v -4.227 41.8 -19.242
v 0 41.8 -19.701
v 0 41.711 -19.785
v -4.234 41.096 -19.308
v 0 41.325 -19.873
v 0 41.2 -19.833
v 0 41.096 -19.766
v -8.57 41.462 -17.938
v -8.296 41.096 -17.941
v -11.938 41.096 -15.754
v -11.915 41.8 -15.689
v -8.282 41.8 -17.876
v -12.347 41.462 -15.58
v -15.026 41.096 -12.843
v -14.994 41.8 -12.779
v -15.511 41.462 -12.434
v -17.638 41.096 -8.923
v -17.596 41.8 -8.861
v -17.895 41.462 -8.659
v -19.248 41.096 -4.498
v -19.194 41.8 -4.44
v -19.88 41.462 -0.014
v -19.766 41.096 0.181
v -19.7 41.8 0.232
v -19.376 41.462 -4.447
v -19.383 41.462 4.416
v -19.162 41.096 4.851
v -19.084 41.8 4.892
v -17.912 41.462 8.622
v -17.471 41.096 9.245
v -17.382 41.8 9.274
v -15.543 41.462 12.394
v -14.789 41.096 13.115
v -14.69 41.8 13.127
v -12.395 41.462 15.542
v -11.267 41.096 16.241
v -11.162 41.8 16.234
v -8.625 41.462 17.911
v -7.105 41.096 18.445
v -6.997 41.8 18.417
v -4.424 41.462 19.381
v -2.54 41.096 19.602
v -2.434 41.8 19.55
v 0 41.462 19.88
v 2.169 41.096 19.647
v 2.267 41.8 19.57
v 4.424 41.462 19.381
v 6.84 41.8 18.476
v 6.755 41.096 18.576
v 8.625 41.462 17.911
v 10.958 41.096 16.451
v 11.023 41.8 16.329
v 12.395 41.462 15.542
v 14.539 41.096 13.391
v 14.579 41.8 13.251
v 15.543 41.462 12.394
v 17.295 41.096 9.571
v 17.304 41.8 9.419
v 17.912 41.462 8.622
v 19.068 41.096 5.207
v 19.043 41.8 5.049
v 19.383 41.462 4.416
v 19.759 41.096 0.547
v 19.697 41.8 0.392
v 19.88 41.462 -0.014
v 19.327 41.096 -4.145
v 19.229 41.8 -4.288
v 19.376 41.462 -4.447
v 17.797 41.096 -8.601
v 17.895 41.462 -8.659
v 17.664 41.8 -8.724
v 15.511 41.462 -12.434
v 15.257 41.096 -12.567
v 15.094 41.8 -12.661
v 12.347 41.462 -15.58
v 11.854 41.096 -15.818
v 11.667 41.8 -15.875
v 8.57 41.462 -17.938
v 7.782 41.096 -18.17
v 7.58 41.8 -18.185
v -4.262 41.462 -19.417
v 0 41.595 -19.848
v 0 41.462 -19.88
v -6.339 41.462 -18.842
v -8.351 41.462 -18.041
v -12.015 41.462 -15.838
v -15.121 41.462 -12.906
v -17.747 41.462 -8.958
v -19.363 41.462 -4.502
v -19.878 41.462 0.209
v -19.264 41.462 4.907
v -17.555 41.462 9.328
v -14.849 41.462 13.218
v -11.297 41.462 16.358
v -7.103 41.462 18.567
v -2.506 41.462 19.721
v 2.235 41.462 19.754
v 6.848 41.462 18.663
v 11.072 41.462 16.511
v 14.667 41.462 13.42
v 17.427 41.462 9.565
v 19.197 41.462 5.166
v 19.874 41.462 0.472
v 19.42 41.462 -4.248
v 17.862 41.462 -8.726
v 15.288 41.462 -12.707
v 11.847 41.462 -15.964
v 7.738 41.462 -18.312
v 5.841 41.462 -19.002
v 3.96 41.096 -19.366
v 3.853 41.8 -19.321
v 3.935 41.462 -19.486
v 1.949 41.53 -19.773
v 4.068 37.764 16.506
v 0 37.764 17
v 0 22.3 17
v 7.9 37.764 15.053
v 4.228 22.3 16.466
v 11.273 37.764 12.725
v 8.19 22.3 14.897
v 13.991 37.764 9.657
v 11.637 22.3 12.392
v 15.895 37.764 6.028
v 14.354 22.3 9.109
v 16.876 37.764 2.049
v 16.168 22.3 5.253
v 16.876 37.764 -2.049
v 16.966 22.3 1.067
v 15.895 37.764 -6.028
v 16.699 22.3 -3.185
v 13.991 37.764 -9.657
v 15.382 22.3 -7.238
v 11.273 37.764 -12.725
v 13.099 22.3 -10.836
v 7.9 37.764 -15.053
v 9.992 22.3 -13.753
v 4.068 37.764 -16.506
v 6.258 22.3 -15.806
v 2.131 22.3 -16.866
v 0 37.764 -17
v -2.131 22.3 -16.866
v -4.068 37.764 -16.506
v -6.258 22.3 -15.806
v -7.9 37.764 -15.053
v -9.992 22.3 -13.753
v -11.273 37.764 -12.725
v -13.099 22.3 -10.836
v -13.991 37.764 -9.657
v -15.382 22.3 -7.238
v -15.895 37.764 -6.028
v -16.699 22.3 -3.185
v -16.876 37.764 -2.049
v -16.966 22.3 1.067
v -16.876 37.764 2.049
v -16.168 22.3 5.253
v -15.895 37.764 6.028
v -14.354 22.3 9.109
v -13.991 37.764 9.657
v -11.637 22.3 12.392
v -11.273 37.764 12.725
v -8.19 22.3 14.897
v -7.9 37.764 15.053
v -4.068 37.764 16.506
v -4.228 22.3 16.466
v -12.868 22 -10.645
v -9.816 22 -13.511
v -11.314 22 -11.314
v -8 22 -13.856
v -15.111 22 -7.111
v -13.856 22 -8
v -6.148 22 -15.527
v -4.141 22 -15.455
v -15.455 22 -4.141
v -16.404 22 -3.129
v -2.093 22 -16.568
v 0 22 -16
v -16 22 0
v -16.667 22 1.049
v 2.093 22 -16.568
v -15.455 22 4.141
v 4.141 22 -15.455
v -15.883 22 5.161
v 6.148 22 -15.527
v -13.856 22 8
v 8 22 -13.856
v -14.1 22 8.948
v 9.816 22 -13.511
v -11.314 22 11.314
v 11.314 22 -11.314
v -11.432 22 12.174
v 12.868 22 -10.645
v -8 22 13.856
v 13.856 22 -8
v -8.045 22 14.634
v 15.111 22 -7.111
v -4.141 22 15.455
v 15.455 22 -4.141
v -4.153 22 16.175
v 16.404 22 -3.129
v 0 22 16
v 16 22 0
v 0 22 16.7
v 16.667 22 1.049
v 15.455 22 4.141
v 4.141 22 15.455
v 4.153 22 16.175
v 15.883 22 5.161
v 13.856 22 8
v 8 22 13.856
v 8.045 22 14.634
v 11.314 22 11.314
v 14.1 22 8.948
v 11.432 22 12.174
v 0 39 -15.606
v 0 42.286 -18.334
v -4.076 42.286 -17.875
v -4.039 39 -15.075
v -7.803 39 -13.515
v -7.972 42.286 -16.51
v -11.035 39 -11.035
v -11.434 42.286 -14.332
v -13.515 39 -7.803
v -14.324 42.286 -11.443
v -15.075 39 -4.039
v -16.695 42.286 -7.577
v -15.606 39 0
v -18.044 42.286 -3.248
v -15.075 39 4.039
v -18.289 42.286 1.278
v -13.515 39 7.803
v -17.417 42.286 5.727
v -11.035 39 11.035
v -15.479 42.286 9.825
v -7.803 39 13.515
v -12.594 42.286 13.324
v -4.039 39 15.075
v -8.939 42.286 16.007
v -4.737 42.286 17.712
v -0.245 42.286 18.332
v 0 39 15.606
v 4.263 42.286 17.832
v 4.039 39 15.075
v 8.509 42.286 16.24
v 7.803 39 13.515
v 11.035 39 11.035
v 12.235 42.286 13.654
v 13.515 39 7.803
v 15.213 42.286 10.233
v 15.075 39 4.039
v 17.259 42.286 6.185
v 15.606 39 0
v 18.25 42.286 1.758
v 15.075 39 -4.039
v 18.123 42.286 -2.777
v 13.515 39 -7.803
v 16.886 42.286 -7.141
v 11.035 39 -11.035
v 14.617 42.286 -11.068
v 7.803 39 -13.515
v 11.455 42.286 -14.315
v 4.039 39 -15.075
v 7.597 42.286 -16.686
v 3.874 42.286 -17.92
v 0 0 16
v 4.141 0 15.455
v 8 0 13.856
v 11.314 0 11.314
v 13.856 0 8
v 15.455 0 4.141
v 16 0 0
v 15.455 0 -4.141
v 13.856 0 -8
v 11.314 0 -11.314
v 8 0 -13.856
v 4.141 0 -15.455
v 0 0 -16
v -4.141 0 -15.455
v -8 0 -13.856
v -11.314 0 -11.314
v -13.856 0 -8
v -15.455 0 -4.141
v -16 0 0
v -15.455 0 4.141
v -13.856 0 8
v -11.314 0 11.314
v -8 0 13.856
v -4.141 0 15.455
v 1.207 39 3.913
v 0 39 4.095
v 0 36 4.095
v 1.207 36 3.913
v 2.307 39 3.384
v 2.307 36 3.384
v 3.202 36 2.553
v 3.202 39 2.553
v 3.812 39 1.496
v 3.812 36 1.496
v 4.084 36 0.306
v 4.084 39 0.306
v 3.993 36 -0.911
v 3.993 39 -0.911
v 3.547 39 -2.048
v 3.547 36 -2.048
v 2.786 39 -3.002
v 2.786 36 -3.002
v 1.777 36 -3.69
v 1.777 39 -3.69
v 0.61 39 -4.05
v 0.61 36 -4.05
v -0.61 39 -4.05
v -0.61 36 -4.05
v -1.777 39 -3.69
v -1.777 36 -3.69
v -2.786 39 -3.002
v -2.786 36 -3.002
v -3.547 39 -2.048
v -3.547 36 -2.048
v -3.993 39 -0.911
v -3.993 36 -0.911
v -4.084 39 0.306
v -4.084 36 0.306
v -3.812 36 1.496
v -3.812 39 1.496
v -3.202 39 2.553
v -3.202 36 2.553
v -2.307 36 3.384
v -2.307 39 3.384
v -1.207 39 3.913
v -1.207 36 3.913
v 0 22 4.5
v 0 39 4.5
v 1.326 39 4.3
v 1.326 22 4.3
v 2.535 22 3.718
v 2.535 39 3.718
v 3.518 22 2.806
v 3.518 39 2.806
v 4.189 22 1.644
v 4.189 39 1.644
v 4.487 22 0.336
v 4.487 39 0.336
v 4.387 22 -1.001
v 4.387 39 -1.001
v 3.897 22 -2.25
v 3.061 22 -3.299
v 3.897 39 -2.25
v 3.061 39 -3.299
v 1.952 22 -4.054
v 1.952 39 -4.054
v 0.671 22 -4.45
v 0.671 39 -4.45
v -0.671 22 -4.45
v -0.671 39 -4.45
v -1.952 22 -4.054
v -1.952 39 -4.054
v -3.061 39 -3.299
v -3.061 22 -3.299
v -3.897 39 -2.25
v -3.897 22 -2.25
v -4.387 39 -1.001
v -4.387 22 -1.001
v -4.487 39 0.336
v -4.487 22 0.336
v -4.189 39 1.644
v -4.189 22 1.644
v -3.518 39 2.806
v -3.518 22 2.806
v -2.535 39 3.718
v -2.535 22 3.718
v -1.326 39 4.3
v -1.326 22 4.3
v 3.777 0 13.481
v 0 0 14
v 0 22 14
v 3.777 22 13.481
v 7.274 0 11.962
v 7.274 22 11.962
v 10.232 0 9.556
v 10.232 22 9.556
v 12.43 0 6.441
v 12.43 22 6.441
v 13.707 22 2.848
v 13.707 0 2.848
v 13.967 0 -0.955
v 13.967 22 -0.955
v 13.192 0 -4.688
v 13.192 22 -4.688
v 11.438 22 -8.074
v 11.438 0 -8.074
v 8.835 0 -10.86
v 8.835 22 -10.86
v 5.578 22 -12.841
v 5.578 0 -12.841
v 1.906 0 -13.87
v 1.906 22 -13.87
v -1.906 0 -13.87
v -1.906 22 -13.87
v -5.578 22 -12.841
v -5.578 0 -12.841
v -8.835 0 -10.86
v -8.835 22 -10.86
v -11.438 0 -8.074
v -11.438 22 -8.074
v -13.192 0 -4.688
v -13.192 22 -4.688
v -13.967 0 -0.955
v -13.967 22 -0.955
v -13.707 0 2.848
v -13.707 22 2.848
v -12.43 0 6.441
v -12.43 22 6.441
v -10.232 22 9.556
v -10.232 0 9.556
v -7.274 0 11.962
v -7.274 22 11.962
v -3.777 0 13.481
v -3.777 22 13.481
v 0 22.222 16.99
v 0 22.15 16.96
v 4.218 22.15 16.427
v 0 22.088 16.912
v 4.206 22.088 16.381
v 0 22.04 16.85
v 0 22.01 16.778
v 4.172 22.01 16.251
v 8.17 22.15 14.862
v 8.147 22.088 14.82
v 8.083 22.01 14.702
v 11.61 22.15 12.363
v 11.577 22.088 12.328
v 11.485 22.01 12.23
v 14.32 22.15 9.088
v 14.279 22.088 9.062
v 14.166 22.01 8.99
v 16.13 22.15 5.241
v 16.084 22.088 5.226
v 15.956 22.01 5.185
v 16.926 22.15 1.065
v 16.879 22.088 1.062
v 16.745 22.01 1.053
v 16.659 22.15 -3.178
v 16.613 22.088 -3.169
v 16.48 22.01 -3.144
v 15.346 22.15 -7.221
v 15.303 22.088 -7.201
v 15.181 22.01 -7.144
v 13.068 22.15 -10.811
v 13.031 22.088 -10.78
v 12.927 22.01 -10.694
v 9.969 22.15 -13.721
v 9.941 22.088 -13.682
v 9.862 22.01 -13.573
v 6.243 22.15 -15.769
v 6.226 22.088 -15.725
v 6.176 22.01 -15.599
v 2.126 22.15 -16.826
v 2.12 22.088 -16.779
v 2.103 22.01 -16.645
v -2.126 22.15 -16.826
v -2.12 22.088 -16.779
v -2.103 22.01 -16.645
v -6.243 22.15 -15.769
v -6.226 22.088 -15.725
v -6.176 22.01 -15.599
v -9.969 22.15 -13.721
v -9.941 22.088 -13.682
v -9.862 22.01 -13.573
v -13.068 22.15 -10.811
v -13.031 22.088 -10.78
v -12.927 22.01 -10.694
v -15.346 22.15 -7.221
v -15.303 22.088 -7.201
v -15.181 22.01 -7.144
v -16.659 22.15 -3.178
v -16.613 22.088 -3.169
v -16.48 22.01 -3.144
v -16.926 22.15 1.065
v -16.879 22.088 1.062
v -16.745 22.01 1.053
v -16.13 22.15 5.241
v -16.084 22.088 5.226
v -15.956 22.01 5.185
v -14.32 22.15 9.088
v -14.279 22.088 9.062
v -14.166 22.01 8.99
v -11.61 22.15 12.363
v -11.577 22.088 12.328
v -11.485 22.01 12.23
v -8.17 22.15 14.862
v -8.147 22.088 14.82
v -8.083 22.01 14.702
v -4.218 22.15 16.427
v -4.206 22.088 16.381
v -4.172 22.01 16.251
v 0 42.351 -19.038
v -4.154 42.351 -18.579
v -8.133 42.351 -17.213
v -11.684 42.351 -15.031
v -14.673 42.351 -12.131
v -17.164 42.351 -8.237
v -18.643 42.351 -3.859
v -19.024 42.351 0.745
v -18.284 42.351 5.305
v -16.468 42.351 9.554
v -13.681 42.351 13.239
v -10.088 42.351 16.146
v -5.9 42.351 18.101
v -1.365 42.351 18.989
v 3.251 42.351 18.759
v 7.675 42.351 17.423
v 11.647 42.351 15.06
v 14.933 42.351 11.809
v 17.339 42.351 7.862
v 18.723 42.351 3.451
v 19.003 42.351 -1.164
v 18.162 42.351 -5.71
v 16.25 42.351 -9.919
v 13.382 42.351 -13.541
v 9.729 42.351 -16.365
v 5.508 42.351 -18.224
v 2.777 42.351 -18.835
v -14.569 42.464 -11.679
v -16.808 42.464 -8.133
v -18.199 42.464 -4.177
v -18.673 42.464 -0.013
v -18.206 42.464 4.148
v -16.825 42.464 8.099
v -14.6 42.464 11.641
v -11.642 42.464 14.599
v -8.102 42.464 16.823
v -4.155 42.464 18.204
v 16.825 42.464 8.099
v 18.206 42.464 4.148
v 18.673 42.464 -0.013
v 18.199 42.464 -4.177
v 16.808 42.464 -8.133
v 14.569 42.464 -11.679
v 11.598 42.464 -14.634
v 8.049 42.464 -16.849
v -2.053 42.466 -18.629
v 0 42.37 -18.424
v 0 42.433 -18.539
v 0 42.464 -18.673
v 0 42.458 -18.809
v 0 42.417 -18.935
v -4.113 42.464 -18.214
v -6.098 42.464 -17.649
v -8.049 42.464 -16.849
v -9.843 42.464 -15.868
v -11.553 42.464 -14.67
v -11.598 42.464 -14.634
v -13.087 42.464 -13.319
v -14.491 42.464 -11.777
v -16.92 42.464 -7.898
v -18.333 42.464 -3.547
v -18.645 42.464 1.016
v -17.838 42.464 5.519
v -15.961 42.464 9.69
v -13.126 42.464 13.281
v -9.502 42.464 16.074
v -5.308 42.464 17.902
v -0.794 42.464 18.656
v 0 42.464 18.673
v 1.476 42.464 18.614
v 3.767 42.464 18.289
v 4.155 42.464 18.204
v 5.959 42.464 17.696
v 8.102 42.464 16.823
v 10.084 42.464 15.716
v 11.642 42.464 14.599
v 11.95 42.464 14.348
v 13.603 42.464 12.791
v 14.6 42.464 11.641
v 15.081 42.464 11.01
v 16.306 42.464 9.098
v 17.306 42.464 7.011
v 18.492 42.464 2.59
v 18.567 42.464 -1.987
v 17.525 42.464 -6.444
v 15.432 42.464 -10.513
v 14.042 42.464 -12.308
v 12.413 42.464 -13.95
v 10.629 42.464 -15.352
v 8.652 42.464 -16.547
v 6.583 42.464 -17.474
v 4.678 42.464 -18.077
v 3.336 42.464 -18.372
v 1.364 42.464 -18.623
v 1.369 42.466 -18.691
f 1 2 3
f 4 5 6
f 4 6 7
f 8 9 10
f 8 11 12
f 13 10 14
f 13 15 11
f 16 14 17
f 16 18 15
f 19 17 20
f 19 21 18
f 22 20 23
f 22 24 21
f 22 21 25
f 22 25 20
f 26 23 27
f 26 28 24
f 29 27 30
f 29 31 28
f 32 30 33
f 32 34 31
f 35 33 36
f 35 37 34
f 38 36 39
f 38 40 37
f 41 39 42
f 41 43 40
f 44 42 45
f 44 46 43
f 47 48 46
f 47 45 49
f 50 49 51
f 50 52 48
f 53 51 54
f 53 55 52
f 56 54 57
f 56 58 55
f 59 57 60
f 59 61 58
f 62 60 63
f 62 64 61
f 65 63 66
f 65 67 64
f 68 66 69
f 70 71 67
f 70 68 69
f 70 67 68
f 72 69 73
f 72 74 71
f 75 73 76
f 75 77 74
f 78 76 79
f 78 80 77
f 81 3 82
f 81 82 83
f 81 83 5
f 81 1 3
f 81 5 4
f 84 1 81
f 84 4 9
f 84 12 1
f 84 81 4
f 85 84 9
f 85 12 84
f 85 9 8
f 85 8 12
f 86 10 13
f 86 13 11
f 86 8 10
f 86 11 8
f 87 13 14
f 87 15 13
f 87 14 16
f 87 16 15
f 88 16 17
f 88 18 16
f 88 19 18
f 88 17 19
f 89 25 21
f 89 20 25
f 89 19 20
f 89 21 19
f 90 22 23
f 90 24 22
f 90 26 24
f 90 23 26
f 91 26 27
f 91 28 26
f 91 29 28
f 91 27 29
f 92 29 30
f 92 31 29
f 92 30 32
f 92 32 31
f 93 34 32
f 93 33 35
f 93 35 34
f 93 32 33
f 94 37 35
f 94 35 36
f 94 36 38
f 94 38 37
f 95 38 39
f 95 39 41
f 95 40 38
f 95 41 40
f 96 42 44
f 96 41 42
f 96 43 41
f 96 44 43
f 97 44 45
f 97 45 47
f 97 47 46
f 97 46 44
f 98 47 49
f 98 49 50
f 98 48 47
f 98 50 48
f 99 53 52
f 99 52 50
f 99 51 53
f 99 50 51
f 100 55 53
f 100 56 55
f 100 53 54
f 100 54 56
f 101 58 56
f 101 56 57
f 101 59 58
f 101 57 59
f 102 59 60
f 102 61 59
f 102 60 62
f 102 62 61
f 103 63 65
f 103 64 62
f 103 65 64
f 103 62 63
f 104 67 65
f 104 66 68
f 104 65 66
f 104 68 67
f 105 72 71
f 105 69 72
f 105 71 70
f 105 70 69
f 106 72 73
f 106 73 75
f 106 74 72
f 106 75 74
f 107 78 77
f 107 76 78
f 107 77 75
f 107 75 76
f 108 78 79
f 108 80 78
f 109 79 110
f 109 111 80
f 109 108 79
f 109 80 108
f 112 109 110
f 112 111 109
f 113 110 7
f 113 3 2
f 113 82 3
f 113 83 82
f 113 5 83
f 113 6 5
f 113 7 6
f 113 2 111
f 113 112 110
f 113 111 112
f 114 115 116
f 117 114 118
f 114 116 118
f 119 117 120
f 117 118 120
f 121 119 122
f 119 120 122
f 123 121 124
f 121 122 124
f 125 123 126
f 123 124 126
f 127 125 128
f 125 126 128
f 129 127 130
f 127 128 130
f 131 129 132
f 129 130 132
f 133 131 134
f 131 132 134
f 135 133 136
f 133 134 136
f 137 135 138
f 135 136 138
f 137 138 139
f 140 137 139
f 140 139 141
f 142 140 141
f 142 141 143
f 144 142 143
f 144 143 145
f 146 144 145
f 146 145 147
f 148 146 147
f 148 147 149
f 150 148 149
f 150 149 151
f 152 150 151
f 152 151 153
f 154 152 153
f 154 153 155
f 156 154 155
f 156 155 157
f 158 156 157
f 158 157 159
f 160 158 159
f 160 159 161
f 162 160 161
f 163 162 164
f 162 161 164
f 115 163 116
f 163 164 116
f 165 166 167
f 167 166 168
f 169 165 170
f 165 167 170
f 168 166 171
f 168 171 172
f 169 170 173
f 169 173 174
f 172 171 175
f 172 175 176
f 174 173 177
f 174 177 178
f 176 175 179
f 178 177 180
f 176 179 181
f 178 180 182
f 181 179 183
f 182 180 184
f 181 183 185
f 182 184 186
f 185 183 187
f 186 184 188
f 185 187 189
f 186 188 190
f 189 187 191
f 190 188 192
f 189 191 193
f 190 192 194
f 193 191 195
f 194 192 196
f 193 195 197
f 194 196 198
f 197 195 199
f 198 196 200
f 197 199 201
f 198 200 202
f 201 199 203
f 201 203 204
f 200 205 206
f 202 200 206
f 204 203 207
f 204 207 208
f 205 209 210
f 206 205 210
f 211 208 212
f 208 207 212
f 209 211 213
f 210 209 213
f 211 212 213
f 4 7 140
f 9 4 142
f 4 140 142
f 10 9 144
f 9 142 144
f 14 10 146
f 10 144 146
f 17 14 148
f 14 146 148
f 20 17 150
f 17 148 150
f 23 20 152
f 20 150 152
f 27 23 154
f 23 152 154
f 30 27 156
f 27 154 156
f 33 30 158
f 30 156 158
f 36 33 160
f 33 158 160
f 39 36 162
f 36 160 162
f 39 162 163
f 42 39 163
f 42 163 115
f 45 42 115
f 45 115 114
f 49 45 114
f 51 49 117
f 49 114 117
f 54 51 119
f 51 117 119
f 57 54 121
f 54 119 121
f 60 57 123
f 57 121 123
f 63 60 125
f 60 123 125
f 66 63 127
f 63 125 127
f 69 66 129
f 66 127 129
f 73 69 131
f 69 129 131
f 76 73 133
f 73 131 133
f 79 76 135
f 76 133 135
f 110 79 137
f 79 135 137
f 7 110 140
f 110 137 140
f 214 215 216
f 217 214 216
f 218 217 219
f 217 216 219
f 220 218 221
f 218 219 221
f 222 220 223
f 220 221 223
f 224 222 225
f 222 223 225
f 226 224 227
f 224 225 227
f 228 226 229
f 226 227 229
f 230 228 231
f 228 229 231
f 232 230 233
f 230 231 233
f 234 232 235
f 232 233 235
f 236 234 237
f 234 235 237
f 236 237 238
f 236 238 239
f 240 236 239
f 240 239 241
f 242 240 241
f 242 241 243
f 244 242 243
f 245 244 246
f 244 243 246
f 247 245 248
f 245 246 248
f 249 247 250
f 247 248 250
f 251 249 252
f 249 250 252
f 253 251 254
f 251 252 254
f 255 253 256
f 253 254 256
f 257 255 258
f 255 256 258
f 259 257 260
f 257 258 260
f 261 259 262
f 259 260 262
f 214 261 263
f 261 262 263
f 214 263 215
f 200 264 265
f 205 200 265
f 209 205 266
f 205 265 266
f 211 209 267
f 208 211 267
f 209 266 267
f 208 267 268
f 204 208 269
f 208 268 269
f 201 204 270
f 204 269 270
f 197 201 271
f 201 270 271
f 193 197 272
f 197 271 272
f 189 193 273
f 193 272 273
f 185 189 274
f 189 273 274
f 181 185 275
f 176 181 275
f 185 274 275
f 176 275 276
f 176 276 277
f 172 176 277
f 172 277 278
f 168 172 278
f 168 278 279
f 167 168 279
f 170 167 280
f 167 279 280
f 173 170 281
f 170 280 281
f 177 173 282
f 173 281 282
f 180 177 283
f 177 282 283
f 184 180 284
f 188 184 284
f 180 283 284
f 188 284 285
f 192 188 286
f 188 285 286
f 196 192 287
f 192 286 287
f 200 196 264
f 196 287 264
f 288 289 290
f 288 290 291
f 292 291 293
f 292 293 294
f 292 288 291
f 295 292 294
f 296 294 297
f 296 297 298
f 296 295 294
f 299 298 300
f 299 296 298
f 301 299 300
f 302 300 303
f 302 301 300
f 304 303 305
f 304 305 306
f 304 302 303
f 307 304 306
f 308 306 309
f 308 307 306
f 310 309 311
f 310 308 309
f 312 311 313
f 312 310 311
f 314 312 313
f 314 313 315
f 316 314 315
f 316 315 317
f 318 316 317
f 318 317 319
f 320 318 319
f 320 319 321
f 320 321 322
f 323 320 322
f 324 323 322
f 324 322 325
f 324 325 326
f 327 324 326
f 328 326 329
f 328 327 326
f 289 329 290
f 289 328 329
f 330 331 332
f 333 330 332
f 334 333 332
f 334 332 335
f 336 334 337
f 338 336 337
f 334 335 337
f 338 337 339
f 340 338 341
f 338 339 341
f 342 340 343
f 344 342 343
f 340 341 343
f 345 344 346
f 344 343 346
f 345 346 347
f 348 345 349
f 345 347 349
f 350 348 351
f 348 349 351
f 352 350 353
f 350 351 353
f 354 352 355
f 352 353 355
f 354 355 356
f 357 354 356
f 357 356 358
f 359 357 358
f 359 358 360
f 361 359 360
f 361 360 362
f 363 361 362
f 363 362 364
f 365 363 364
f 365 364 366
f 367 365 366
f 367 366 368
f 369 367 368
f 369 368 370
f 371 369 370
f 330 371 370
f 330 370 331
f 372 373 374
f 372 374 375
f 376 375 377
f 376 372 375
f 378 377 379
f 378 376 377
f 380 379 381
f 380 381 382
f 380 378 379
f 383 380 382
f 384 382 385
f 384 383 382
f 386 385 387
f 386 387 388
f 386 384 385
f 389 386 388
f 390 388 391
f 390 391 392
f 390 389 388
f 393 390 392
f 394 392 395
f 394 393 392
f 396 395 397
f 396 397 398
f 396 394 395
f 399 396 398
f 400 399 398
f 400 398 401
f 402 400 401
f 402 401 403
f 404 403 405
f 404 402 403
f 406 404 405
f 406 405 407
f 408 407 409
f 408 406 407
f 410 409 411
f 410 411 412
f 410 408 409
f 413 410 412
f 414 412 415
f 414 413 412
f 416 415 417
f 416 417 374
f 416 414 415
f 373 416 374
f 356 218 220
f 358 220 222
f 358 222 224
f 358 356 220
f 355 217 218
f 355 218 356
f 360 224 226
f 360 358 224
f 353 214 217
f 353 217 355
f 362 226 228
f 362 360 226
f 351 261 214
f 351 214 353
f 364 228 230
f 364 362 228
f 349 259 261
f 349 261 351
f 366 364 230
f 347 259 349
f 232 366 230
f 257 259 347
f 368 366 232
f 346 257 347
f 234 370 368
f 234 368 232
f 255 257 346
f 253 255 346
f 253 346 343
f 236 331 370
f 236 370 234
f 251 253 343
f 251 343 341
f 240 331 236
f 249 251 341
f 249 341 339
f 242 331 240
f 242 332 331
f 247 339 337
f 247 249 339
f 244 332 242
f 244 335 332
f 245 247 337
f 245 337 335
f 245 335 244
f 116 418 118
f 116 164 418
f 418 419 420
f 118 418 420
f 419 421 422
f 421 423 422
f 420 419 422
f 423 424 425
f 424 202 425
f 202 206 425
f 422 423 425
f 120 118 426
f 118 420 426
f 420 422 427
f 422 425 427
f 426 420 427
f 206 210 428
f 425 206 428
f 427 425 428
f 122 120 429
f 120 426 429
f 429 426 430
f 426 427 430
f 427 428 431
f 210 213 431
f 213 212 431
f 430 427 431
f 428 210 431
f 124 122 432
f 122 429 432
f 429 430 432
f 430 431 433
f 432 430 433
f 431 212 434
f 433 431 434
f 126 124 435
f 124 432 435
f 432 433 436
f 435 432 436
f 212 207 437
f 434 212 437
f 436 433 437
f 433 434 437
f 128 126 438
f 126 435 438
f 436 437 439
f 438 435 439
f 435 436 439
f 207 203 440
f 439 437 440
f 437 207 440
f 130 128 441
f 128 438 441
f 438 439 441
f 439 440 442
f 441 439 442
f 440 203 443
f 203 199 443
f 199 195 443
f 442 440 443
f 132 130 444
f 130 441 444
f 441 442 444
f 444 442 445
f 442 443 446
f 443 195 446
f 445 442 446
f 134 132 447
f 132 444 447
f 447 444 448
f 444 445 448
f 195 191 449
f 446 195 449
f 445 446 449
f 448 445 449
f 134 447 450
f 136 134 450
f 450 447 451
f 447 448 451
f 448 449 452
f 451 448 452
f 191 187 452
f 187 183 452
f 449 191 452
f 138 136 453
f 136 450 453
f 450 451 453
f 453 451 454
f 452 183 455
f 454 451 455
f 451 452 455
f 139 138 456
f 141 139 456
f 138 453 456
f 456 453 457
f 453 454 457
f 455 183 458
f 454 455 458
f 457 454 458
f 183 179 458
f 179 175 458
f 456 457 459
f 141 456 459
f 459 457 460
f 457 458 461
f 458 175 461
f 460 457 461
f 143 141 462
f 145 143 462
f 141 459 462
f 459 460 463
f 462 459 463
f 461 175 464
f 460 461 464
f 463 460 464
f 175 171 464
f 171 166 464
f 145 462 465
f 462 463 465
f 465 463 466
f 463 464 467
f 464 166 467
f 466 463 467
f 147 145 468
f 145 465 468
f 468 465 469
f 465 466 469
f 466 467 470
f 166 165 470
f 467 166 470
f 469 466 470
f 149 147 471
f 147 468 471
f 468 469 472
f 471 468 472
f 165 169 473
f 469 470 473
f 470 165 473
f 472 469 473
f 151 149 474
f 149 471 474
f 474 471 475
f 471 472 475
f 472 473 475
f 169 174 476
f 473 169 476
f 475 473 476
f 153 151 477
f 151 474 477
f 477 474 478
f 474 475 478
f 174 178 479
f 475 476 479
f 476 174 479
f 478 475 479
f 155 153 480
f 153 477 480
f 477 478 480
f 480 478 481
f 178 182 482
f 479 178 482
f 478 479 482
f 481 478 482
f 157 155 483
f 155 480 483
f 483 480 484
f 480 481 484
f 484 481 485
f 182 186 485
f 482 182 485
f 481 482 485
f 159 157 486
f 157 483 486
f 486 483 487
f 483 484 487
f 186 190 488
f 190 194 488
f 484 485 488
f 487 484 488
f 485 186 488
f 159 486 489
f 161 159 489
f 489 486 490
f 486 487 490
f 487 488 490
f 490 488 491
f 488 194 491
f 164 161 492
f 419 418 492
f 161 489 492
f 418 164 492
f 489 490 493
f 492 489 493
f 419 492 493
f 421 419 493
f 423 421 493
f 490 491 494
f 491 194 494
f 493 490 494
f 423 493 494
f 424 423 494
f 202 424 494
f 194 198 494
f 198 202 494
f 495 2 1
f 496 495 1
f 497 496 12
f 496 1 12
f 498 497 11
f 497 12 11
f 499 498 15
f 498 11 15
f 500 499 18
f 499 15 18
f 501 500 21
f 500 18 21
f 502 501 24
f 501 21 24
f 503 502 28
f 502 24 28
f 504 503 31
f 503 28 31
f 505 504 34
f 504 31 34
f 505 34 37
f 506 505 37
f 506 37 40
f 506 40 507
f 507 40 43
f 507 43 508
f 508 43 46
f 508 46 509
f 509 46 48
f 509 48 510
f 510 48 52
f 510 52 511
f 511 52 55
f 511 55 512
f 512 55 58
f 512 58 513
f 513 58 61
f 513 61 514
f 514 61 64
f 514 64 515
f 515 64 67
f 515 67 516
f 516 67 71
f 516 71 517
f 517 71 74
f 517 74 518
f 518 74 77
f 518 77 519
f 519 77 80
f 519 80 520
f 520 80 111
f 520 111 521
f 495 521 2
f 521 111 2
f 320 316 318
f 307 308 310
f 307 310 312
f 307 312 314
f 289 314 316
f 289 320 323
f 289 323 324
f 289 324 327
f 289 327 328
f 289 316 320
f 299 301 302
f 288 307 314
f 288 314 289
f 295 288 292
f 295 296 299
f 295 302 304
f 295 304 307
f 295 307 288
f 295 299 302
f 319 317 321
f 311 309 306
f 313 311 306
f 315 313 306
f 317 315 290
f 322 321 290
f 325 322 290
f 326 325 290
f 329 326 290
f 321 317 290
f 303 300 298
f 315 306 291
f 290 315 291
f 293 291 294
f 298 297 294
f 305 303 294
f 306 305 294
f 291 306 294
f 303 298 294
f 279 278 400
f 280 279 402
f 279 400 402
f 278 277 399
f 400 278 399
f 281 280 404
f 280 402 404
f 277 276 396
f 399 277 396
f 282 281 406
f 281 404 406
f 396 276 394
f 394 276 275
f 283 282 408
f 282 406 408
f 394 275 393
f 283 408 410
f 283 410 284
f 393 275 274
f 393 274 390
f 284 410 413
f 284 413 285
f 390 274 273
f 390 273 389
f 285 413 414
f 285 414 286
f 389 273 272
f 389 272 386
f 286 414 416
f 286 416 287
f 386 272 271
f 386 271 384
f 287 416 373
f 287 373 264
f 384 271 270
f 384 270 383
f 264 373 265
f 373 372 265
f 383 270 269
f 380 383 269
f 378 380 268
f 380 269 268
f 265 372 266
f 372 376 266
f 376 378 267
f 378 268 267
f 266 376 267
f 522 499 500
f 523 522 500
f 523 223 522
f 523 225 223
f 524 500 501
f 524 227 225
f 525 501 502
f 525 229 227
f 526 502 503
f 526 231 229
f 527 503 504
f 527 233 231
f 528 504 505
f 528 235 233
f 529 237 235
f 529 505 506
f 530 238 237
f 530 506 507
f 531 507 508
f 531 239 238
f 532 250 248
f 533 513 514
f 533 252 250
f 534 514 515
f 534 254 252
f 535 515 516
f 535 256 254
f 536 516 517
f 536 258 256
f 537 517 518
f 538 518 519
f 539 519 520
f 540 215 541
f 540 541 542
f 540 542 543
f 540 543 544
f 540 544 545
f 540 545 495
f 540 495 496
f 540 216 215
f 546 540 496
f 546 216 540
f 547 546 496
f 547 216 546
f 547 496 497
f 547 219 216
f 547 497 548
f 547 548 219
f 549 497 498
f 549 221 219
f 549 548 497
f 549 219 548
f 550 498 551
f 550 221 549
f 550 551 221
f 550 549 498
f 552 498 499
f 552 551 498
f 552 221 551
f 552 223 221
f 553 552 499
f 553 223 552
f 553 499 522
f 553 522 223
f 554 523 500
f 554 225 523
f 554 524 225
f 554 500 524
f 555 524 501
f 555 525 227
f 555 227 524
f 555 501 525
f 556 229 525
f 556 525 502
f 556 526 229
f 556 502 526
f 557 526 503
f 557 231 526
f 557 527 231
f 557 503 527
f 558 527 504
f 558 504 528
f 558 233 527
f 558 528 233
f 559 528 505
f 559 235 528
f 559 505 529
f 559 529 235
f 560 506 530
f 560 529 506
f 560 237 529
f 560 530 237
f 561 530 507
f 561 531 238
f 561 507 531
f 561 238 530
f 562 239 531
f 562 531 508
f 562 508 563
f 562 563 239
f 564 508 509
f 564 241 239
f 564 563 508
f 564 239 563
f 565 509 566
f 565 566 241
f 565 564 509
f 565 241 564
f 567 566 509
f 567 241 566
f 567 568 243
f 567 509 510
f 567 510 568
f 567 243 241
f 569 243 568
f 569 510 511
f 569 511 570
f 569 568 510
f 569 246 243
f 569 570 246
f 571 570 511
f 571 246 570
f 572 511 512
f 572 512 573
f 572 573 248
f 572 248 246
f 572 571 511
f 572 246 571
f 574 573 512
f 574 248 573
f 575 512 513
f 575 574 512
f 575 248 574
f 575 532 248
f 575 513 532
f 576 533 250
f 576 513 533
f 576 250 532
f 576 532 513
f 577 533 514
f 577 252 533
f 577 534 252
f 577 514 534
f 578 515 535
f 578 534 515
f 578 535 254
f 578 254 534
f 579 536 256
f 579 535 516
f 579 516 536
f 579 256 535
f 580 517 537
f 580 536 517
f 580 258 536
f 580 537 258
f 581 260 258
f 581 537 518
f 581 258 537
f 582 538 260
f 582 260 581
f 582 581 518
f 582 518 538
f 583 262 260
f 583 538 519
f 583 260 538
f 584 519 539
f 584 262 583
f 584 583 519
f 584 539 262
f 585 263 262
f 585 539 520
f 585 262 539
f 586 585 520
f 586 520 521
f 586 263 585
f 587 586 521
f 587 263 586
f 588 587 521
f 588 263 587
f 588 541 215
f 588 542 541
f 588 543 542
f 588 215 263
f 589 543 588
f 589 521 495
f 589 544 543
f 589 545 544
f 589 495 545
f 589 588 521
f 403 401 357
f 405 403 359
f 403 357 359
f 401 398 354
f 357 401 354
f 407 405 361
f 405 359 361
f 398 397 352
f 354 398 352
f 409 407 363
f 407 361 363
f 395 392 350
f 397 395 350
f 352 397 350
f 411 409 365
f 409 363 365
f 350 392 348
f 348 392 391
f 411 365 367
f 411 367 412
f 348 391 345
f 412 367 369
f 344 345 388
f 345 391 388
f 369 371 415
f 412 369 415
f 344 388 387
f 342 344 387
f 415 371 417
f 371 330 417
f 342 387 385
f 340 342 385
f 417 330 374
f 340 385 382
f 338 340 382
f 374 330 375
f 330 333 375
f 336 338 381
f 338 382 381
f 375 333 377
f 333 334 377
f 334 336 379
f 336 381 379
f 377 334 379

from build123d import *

# Parameters (mm, degrees)
ESBO_O1_R                = 16
ESBO_O1_R_2              = 14
RESSALTO_EXTRUS_O1_DEPTH = 22
ESBO_O2_R                = 17
RESSALTO_EXTRUS_O2_DEPTH = 17
ESBO_O3_R                = 4.5
CORTE_EXTRUS_O1_DEPTH    = 46.814844756
FILETE1_R                = 0.3
ESBO_O4_R                = 4.095378156
RESSALTO_EXTRUS_O3_DEPTH = 3
FILETE2_R                = 0.5


with BuildPart() as part:
    # Esboço1 → Ressalto-extrusão1 (new body)
    with BuildSketch(Plane(origin=(0, 0, 0), x_dir=(1, 0, 0), z_dir=(0, 1, 0))):
        with Locations(Location((0, 0, 0), (0, 0, 270))):
            Circle(ESBO_O1_R)
        with Locations(Location((0, 0, 0), (0, 0, 270))):
            Circle(ESBO_O1_R_2, mode=Mode.SUBTRACT)
    extrude(amount=RESSALTO_EXTRUS_O1_DEPTH)

    # Esboço2 → Ressalto-extrusão2 (add)
    with BuildSketch(Plane(origin=(0, 22, 0), x_dir=(1, 0, 0), z_dir=(0, 1, 0))):
        with Locations(Location((0, 0, 0), (0, 0, 270))):
            Circle(ESBO_O2_R)
    extrude(amount=RESSALTO_EXTRUS_O2_DEPTH)

    # Esboço3 → Corte-extrusão1 (cut, through all)
    with BuildSketch(Plane(origin=(0, 39, 0), x_dir=(1, 0, 0), z_dir=(0, 1, 0))):
        with Locations(Location((0, 0, 0), (0, 0, 270))):
            Circle(ESBO_O3_R)
    extrude(amount=-CORTE_EXTRUS_O1_DEPTH, mode=Mode.SUBTRACT)

    # Filete1
    filete1_edges = [part.edges().sort_by_distance(p)[0] for p in [
        (0, 39, -17),
        (0, 22, -17),
    ]]
    fillet(filete1_edges, radius=FILETE1_R)

    # Esboço5 → Revolução1 (revolve)
    with BuildSketch(Plane.XY, mode=Mode.PRIVATE) as revolu_o1_sk:
        Polygon((15.606287028, 39), (18.653476558, 42.670201729), (20.085778779, 41.481031037), (17, 37.764350306), align=None)
    revolve(revolu_o1_sk.sketch.rotate(Axis((0, 39, 0), (0, 1, 0)), 90), axis=Axis((0, 39, 0), (0, 1, 0)))

    # Filete2
    filete2_edges = [part.edges().sort_by_distance(p)[0] for p in [
        (0, 42.670201729, 18.653476558),
        (0, 41.481031037, 20.085778779),
    ]]
    fillet(filete2_edges, radius=FILETE2_R)


with BuildPart() as body_2:
    # Esboço4 → Ressalto-extrusão3 (new body)
    with BuildSketch(Plane(origin=(0, 39, 0), x_dir=(1, 0, 0), z_dir=(0, 1, 0))):
        with Locations(Location((0, 0, 0), (0, 0, 270))):
            Circle(ESBO_O4_R)
    extrude(amount=-RESSALTO_EXTRUS_O3_DEPTH)


solid = Compound([part.part, body_2.part])
